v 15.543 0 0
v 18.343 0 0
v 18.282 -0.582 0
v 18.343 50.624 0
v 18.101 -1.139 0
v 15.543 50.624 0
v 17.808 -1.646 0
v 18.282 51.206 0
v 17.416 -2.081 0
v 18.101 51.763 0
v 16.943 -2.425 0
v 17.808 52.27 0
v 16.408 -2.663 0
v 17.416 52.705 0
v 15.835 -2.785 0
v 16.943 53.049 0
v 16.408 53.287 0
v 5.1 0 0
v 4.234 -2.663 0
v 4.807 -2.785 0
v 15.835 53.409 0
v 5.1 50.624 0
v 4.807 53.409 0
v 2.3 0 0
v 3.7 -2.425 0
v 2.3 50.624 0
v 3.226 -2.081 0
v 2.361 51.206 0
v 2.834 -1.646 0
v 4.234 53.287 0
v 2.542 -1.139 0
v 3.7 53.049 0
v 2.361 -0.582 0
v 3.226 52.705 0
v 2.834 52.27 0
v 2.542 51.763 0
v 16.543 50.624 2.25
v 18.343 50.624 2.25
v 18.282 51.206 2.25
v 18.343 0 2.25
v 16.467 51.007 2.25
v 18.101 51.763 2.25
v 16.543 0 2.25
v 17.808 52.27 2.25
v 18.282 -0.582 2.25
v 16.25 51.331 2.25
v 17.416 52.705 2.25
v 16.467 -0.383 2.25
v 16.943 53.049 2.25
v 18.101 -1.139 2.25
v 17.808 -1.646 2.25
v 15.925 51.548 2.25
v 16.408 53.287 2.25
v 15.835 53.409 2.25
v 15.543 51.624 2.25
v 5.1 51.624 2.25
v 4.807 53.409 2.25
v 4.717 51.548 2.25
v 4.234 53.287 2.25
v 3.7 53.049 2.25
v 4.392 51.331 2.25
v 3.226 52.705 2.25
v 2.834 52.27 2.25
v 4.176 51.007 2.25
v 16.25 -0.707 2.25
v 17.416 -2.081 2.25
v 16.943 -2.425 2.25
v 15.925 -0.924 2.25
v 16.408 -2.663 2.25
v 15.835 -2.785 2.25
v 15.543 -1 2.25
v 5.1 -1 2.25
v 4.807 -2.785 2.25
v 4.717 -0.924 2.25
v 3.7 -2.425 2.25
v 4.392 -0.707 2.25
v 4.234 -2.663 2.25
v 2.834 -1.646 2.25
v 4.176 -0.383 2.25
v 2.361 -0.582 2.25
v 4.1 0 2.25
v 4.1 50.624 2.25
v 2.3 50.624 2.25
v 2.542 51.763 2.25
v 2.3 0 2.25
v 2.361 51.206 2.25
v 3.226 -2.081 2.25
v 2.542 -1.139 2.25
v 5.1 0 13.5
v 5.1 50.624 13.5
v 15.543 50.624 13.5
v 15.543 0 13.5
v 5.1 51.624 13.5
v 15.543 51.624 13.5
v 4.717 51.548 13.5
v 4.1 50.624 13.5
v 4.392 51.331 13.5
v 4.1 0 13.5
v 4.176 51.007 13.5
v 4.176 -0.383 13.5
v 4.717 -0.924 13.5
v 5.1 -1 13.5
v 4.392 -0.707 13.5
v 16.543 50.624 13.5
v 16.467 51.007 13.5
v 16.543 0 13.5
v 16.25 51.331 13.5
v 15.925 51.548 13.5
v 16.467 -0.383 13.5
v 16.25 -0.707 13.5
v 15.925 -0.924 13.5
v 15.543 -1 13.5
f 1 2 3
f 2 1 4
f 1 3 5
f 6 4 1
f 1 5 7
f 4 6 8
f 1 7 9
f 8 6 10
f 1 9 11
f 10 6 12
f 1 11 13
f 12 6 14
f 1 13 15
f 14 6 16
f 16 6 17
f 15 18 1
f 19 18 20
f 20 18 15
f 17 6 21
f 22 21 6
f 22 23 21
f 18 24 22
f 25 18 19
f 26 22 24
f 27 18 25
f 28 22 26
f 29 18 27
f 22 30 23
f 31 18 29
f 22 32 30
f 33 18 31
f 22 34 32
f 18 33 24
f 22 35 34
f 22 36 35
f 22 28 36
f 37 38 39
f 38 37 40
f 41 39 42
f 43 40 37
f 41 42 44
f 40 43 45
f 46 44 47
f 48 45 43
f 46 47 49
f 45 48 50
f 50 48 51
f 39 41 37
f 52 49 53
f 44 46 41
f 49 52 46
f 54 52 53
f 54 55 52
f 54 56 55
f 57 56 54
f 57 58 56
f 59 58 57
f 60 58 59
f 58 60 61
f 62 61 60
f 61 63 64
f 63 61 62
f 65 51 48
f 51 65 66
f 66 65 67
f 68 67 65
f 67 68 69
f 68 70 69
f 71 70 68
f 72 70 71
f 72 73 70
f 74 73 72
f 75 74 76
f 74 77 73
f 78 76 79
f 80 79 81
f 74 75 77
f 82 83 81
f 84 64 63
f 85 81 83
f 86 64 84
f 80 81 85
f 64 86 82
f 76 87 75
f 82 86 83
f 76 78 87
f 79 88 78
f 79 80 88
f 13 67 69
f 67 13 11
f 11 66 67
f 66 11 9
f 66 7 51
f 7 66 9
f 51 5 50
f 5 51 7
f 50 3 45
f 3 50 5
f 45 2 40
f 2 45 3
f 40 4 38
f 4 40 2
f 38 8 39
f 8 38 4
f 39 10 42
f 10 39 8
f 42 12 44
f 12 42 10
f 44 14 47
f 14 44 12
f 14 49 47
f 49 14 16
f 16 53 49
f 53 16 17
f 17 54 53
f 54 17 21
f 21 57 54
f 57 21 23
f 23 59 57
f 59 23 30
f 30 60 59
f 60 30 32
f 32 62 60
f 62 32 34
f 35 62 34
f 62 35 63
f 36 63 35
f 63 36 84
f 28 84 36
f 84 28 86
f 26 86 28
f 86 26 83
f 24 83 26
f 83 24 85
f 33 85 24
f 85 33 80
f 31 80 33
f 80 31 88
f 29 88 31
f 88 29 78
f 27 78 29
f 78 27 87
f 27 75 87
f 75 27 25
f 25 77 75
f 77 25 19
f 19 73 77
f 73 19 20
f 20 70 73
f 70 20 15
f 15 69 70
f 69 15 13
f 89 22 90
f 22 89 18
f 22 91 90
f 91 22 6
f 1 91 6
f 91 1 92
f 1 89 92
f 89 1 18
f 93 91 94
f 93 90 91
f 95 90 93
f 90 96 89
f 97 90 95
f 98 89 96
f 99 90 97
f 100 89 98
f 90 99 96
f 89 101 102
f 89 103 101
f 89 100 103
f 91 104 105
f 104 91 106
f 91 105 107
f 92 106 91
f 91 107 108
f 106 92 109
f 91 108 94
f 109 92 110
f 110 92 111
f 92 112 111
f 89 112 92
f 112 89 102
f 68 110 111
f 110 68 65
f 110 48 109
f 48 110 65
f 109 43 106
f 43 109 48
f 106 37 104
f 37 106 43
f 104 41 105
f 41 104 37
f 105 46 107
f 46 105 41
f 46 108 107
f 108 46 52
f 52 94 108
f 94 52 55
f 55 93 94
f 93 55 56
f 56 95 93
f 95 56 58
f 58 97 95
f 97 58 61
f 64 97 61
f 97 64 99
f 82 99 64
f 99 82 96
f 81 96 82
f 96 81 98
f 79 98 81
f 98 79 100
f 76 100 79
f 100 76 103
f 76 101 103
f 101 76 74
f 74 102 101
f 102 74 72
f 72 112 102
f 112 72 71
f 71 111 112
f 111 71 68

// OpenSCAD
// file: Common.scad
module offset_shell(thickness = 0.1) {
  render() {
      difference() {
          minkowski() {
            children();
            circle(2* thickness, center=true);
          }
        children();
      }
   }
}

module cookie_cutter(handle_thickness=8, cutter_tickness=3, total_height=15) {
    union() {
        linear_extrude(height = total_height*(0.15), slices = 60) {
            scale([.2,.2,1]) {
              offset_shell(handle_thickness) {
                children();

              }
            }
        };
        linear_extrude(height = total_height*(0.9), slices = 60)
            translate([0,0,2])
            scale([.2,.2,1]) {
              offset_shell(cutter_tickness) {
                children();
            }
        };
    }
}

module rod_with_clipped_circle(square_d, circle_d, circle_placement) {
    difference() {
        square(square_d, center=true);
        translate(circle_placement) circle(circle_d, center=true);
    }
}

//module cookie_press(handle_thickness=2.5, cutter_tickness=1, total_height=10) {
//    union() {
//        cookie_cutter(handle_thickness, cutter_tickness, total_height);
//        translate([0,0,10]) children();
//    }
//}
//
//
// file: ../ComplexShapes.scad
include <BasicShapes.scad>

module HalfCylinder(r, h, e=1, center=false) {
    translate([0,0, center ? -h/2 : 0])difference(){
        cylinder(h,r,r);
        translate([0,-r,-e])cube([2*r,2*r,h+2*e]);
    }
}

module HalfCircle(r) {
    difference(){
        circle(r);
        translate([-r,-2*r,0]) square(2*r);
    }
}

module Crescent(r, fatten_scale=1, curve_angle=0, rotate=0) {
    r_prime = r / fatten_scale;
    rotate([0,0,rotate]) difference() {
        circle(r_prime*1.1);
        translate([r_prime/4, curve_angle*r_prime/4, 0]) circle(r_prime*fatten_scale);
    }
}


module round_edges(r) {
    minkowski() {
        children();
        circle(r);
    };
}

module CrescentV2(outer_r, inner_r, r_shift, edge_rounding=2) {
    // Different way to construct ... rounded edges ...
   round_edges(edge_rounding) {
        difference() {
            circle(outer_r);
            translate(r_shift) circle(inner_r);
        };
    };
}


//module Arch(x,y,r) {
//    // http://kitwallace.co.uk/Blog/item/2013-01-28T17:59:00Z
//    union() {
//        intersection() {
//           translate([x,y,0]) circle(r);
//           translate([-x,y,0]) circle(r);
//        }
//        translate([0,y/2,0]) square(size=[2 * (r-x), y], center=true);
//    }
//}

module Arch(width, arc_height, strech_height=0) {
    // http://kitwallace.co.uk/Blog/item/2013-01-28T17:59:00Z
    r = arc_height;
    x = (width / 2) - r;
    y = arc_height + strech_height;
    union() {
        intersection() {
           translate([x,y,0]) circle(r);
           translate([-x,y,0]) circle(r);
        }
        translate([0,y/2,0]) square(size=[width, y], center=true);
    }
}
// file: ../BasicShapes.scad
module Star(points, outer, inner_defaulted=0) {
    inner = inner_defaulted == 0 ? 2 * outer  : inner_defaulted;
	// polar to cartesian: radius/angle to x/y
	function x(r, a) = r * cos(a);
	function y(r, a) = r * sin(a);
	
	// angular width of each pie slice of the star
	increment = 360/points;
	
	union() {
		for (p = [0 : points-1]) {
			
			// outer is outer point p
			// inner is inner point following p
			// next is next outer point following p

			assign(	
                x_outer = x(outer, increment * p),
                y_outer = y(outer, increment * p),
                x_inner = x(inner, (increment * p) + (increment/2)),
                y_inner = y(inner, (increment * p) + (increment/2)),
                x_next  = x(outer, increment * (p+1)),
                y_next  = y(outer, increment * (p+1))
            ) {
				polygon(
                    points = [
                        [x_outer, y_outer], 
                        [x_inner, y_inner],
                        [x_next, y_next], 
                        [0, 0]
                    ], 
                    paths  = [[0, 1, 2, 3]]
                );
			}
		}
	}
}

//https://github.com/openscad/MCAD/blob/master/shapes.scad
module Hexagon(size) {
  Star(3, size, size);
}

module Octagon(size) {
  Star(4, size, size);
}
// main file
include <../BasicShapes.scad>
include <../ComplexShapes.scad>
include <Common.scad>

cookie_cutter(7,2.5,15) {
    scale([20,25,1]) text("I", font = "Tre:style=Bold");
}
